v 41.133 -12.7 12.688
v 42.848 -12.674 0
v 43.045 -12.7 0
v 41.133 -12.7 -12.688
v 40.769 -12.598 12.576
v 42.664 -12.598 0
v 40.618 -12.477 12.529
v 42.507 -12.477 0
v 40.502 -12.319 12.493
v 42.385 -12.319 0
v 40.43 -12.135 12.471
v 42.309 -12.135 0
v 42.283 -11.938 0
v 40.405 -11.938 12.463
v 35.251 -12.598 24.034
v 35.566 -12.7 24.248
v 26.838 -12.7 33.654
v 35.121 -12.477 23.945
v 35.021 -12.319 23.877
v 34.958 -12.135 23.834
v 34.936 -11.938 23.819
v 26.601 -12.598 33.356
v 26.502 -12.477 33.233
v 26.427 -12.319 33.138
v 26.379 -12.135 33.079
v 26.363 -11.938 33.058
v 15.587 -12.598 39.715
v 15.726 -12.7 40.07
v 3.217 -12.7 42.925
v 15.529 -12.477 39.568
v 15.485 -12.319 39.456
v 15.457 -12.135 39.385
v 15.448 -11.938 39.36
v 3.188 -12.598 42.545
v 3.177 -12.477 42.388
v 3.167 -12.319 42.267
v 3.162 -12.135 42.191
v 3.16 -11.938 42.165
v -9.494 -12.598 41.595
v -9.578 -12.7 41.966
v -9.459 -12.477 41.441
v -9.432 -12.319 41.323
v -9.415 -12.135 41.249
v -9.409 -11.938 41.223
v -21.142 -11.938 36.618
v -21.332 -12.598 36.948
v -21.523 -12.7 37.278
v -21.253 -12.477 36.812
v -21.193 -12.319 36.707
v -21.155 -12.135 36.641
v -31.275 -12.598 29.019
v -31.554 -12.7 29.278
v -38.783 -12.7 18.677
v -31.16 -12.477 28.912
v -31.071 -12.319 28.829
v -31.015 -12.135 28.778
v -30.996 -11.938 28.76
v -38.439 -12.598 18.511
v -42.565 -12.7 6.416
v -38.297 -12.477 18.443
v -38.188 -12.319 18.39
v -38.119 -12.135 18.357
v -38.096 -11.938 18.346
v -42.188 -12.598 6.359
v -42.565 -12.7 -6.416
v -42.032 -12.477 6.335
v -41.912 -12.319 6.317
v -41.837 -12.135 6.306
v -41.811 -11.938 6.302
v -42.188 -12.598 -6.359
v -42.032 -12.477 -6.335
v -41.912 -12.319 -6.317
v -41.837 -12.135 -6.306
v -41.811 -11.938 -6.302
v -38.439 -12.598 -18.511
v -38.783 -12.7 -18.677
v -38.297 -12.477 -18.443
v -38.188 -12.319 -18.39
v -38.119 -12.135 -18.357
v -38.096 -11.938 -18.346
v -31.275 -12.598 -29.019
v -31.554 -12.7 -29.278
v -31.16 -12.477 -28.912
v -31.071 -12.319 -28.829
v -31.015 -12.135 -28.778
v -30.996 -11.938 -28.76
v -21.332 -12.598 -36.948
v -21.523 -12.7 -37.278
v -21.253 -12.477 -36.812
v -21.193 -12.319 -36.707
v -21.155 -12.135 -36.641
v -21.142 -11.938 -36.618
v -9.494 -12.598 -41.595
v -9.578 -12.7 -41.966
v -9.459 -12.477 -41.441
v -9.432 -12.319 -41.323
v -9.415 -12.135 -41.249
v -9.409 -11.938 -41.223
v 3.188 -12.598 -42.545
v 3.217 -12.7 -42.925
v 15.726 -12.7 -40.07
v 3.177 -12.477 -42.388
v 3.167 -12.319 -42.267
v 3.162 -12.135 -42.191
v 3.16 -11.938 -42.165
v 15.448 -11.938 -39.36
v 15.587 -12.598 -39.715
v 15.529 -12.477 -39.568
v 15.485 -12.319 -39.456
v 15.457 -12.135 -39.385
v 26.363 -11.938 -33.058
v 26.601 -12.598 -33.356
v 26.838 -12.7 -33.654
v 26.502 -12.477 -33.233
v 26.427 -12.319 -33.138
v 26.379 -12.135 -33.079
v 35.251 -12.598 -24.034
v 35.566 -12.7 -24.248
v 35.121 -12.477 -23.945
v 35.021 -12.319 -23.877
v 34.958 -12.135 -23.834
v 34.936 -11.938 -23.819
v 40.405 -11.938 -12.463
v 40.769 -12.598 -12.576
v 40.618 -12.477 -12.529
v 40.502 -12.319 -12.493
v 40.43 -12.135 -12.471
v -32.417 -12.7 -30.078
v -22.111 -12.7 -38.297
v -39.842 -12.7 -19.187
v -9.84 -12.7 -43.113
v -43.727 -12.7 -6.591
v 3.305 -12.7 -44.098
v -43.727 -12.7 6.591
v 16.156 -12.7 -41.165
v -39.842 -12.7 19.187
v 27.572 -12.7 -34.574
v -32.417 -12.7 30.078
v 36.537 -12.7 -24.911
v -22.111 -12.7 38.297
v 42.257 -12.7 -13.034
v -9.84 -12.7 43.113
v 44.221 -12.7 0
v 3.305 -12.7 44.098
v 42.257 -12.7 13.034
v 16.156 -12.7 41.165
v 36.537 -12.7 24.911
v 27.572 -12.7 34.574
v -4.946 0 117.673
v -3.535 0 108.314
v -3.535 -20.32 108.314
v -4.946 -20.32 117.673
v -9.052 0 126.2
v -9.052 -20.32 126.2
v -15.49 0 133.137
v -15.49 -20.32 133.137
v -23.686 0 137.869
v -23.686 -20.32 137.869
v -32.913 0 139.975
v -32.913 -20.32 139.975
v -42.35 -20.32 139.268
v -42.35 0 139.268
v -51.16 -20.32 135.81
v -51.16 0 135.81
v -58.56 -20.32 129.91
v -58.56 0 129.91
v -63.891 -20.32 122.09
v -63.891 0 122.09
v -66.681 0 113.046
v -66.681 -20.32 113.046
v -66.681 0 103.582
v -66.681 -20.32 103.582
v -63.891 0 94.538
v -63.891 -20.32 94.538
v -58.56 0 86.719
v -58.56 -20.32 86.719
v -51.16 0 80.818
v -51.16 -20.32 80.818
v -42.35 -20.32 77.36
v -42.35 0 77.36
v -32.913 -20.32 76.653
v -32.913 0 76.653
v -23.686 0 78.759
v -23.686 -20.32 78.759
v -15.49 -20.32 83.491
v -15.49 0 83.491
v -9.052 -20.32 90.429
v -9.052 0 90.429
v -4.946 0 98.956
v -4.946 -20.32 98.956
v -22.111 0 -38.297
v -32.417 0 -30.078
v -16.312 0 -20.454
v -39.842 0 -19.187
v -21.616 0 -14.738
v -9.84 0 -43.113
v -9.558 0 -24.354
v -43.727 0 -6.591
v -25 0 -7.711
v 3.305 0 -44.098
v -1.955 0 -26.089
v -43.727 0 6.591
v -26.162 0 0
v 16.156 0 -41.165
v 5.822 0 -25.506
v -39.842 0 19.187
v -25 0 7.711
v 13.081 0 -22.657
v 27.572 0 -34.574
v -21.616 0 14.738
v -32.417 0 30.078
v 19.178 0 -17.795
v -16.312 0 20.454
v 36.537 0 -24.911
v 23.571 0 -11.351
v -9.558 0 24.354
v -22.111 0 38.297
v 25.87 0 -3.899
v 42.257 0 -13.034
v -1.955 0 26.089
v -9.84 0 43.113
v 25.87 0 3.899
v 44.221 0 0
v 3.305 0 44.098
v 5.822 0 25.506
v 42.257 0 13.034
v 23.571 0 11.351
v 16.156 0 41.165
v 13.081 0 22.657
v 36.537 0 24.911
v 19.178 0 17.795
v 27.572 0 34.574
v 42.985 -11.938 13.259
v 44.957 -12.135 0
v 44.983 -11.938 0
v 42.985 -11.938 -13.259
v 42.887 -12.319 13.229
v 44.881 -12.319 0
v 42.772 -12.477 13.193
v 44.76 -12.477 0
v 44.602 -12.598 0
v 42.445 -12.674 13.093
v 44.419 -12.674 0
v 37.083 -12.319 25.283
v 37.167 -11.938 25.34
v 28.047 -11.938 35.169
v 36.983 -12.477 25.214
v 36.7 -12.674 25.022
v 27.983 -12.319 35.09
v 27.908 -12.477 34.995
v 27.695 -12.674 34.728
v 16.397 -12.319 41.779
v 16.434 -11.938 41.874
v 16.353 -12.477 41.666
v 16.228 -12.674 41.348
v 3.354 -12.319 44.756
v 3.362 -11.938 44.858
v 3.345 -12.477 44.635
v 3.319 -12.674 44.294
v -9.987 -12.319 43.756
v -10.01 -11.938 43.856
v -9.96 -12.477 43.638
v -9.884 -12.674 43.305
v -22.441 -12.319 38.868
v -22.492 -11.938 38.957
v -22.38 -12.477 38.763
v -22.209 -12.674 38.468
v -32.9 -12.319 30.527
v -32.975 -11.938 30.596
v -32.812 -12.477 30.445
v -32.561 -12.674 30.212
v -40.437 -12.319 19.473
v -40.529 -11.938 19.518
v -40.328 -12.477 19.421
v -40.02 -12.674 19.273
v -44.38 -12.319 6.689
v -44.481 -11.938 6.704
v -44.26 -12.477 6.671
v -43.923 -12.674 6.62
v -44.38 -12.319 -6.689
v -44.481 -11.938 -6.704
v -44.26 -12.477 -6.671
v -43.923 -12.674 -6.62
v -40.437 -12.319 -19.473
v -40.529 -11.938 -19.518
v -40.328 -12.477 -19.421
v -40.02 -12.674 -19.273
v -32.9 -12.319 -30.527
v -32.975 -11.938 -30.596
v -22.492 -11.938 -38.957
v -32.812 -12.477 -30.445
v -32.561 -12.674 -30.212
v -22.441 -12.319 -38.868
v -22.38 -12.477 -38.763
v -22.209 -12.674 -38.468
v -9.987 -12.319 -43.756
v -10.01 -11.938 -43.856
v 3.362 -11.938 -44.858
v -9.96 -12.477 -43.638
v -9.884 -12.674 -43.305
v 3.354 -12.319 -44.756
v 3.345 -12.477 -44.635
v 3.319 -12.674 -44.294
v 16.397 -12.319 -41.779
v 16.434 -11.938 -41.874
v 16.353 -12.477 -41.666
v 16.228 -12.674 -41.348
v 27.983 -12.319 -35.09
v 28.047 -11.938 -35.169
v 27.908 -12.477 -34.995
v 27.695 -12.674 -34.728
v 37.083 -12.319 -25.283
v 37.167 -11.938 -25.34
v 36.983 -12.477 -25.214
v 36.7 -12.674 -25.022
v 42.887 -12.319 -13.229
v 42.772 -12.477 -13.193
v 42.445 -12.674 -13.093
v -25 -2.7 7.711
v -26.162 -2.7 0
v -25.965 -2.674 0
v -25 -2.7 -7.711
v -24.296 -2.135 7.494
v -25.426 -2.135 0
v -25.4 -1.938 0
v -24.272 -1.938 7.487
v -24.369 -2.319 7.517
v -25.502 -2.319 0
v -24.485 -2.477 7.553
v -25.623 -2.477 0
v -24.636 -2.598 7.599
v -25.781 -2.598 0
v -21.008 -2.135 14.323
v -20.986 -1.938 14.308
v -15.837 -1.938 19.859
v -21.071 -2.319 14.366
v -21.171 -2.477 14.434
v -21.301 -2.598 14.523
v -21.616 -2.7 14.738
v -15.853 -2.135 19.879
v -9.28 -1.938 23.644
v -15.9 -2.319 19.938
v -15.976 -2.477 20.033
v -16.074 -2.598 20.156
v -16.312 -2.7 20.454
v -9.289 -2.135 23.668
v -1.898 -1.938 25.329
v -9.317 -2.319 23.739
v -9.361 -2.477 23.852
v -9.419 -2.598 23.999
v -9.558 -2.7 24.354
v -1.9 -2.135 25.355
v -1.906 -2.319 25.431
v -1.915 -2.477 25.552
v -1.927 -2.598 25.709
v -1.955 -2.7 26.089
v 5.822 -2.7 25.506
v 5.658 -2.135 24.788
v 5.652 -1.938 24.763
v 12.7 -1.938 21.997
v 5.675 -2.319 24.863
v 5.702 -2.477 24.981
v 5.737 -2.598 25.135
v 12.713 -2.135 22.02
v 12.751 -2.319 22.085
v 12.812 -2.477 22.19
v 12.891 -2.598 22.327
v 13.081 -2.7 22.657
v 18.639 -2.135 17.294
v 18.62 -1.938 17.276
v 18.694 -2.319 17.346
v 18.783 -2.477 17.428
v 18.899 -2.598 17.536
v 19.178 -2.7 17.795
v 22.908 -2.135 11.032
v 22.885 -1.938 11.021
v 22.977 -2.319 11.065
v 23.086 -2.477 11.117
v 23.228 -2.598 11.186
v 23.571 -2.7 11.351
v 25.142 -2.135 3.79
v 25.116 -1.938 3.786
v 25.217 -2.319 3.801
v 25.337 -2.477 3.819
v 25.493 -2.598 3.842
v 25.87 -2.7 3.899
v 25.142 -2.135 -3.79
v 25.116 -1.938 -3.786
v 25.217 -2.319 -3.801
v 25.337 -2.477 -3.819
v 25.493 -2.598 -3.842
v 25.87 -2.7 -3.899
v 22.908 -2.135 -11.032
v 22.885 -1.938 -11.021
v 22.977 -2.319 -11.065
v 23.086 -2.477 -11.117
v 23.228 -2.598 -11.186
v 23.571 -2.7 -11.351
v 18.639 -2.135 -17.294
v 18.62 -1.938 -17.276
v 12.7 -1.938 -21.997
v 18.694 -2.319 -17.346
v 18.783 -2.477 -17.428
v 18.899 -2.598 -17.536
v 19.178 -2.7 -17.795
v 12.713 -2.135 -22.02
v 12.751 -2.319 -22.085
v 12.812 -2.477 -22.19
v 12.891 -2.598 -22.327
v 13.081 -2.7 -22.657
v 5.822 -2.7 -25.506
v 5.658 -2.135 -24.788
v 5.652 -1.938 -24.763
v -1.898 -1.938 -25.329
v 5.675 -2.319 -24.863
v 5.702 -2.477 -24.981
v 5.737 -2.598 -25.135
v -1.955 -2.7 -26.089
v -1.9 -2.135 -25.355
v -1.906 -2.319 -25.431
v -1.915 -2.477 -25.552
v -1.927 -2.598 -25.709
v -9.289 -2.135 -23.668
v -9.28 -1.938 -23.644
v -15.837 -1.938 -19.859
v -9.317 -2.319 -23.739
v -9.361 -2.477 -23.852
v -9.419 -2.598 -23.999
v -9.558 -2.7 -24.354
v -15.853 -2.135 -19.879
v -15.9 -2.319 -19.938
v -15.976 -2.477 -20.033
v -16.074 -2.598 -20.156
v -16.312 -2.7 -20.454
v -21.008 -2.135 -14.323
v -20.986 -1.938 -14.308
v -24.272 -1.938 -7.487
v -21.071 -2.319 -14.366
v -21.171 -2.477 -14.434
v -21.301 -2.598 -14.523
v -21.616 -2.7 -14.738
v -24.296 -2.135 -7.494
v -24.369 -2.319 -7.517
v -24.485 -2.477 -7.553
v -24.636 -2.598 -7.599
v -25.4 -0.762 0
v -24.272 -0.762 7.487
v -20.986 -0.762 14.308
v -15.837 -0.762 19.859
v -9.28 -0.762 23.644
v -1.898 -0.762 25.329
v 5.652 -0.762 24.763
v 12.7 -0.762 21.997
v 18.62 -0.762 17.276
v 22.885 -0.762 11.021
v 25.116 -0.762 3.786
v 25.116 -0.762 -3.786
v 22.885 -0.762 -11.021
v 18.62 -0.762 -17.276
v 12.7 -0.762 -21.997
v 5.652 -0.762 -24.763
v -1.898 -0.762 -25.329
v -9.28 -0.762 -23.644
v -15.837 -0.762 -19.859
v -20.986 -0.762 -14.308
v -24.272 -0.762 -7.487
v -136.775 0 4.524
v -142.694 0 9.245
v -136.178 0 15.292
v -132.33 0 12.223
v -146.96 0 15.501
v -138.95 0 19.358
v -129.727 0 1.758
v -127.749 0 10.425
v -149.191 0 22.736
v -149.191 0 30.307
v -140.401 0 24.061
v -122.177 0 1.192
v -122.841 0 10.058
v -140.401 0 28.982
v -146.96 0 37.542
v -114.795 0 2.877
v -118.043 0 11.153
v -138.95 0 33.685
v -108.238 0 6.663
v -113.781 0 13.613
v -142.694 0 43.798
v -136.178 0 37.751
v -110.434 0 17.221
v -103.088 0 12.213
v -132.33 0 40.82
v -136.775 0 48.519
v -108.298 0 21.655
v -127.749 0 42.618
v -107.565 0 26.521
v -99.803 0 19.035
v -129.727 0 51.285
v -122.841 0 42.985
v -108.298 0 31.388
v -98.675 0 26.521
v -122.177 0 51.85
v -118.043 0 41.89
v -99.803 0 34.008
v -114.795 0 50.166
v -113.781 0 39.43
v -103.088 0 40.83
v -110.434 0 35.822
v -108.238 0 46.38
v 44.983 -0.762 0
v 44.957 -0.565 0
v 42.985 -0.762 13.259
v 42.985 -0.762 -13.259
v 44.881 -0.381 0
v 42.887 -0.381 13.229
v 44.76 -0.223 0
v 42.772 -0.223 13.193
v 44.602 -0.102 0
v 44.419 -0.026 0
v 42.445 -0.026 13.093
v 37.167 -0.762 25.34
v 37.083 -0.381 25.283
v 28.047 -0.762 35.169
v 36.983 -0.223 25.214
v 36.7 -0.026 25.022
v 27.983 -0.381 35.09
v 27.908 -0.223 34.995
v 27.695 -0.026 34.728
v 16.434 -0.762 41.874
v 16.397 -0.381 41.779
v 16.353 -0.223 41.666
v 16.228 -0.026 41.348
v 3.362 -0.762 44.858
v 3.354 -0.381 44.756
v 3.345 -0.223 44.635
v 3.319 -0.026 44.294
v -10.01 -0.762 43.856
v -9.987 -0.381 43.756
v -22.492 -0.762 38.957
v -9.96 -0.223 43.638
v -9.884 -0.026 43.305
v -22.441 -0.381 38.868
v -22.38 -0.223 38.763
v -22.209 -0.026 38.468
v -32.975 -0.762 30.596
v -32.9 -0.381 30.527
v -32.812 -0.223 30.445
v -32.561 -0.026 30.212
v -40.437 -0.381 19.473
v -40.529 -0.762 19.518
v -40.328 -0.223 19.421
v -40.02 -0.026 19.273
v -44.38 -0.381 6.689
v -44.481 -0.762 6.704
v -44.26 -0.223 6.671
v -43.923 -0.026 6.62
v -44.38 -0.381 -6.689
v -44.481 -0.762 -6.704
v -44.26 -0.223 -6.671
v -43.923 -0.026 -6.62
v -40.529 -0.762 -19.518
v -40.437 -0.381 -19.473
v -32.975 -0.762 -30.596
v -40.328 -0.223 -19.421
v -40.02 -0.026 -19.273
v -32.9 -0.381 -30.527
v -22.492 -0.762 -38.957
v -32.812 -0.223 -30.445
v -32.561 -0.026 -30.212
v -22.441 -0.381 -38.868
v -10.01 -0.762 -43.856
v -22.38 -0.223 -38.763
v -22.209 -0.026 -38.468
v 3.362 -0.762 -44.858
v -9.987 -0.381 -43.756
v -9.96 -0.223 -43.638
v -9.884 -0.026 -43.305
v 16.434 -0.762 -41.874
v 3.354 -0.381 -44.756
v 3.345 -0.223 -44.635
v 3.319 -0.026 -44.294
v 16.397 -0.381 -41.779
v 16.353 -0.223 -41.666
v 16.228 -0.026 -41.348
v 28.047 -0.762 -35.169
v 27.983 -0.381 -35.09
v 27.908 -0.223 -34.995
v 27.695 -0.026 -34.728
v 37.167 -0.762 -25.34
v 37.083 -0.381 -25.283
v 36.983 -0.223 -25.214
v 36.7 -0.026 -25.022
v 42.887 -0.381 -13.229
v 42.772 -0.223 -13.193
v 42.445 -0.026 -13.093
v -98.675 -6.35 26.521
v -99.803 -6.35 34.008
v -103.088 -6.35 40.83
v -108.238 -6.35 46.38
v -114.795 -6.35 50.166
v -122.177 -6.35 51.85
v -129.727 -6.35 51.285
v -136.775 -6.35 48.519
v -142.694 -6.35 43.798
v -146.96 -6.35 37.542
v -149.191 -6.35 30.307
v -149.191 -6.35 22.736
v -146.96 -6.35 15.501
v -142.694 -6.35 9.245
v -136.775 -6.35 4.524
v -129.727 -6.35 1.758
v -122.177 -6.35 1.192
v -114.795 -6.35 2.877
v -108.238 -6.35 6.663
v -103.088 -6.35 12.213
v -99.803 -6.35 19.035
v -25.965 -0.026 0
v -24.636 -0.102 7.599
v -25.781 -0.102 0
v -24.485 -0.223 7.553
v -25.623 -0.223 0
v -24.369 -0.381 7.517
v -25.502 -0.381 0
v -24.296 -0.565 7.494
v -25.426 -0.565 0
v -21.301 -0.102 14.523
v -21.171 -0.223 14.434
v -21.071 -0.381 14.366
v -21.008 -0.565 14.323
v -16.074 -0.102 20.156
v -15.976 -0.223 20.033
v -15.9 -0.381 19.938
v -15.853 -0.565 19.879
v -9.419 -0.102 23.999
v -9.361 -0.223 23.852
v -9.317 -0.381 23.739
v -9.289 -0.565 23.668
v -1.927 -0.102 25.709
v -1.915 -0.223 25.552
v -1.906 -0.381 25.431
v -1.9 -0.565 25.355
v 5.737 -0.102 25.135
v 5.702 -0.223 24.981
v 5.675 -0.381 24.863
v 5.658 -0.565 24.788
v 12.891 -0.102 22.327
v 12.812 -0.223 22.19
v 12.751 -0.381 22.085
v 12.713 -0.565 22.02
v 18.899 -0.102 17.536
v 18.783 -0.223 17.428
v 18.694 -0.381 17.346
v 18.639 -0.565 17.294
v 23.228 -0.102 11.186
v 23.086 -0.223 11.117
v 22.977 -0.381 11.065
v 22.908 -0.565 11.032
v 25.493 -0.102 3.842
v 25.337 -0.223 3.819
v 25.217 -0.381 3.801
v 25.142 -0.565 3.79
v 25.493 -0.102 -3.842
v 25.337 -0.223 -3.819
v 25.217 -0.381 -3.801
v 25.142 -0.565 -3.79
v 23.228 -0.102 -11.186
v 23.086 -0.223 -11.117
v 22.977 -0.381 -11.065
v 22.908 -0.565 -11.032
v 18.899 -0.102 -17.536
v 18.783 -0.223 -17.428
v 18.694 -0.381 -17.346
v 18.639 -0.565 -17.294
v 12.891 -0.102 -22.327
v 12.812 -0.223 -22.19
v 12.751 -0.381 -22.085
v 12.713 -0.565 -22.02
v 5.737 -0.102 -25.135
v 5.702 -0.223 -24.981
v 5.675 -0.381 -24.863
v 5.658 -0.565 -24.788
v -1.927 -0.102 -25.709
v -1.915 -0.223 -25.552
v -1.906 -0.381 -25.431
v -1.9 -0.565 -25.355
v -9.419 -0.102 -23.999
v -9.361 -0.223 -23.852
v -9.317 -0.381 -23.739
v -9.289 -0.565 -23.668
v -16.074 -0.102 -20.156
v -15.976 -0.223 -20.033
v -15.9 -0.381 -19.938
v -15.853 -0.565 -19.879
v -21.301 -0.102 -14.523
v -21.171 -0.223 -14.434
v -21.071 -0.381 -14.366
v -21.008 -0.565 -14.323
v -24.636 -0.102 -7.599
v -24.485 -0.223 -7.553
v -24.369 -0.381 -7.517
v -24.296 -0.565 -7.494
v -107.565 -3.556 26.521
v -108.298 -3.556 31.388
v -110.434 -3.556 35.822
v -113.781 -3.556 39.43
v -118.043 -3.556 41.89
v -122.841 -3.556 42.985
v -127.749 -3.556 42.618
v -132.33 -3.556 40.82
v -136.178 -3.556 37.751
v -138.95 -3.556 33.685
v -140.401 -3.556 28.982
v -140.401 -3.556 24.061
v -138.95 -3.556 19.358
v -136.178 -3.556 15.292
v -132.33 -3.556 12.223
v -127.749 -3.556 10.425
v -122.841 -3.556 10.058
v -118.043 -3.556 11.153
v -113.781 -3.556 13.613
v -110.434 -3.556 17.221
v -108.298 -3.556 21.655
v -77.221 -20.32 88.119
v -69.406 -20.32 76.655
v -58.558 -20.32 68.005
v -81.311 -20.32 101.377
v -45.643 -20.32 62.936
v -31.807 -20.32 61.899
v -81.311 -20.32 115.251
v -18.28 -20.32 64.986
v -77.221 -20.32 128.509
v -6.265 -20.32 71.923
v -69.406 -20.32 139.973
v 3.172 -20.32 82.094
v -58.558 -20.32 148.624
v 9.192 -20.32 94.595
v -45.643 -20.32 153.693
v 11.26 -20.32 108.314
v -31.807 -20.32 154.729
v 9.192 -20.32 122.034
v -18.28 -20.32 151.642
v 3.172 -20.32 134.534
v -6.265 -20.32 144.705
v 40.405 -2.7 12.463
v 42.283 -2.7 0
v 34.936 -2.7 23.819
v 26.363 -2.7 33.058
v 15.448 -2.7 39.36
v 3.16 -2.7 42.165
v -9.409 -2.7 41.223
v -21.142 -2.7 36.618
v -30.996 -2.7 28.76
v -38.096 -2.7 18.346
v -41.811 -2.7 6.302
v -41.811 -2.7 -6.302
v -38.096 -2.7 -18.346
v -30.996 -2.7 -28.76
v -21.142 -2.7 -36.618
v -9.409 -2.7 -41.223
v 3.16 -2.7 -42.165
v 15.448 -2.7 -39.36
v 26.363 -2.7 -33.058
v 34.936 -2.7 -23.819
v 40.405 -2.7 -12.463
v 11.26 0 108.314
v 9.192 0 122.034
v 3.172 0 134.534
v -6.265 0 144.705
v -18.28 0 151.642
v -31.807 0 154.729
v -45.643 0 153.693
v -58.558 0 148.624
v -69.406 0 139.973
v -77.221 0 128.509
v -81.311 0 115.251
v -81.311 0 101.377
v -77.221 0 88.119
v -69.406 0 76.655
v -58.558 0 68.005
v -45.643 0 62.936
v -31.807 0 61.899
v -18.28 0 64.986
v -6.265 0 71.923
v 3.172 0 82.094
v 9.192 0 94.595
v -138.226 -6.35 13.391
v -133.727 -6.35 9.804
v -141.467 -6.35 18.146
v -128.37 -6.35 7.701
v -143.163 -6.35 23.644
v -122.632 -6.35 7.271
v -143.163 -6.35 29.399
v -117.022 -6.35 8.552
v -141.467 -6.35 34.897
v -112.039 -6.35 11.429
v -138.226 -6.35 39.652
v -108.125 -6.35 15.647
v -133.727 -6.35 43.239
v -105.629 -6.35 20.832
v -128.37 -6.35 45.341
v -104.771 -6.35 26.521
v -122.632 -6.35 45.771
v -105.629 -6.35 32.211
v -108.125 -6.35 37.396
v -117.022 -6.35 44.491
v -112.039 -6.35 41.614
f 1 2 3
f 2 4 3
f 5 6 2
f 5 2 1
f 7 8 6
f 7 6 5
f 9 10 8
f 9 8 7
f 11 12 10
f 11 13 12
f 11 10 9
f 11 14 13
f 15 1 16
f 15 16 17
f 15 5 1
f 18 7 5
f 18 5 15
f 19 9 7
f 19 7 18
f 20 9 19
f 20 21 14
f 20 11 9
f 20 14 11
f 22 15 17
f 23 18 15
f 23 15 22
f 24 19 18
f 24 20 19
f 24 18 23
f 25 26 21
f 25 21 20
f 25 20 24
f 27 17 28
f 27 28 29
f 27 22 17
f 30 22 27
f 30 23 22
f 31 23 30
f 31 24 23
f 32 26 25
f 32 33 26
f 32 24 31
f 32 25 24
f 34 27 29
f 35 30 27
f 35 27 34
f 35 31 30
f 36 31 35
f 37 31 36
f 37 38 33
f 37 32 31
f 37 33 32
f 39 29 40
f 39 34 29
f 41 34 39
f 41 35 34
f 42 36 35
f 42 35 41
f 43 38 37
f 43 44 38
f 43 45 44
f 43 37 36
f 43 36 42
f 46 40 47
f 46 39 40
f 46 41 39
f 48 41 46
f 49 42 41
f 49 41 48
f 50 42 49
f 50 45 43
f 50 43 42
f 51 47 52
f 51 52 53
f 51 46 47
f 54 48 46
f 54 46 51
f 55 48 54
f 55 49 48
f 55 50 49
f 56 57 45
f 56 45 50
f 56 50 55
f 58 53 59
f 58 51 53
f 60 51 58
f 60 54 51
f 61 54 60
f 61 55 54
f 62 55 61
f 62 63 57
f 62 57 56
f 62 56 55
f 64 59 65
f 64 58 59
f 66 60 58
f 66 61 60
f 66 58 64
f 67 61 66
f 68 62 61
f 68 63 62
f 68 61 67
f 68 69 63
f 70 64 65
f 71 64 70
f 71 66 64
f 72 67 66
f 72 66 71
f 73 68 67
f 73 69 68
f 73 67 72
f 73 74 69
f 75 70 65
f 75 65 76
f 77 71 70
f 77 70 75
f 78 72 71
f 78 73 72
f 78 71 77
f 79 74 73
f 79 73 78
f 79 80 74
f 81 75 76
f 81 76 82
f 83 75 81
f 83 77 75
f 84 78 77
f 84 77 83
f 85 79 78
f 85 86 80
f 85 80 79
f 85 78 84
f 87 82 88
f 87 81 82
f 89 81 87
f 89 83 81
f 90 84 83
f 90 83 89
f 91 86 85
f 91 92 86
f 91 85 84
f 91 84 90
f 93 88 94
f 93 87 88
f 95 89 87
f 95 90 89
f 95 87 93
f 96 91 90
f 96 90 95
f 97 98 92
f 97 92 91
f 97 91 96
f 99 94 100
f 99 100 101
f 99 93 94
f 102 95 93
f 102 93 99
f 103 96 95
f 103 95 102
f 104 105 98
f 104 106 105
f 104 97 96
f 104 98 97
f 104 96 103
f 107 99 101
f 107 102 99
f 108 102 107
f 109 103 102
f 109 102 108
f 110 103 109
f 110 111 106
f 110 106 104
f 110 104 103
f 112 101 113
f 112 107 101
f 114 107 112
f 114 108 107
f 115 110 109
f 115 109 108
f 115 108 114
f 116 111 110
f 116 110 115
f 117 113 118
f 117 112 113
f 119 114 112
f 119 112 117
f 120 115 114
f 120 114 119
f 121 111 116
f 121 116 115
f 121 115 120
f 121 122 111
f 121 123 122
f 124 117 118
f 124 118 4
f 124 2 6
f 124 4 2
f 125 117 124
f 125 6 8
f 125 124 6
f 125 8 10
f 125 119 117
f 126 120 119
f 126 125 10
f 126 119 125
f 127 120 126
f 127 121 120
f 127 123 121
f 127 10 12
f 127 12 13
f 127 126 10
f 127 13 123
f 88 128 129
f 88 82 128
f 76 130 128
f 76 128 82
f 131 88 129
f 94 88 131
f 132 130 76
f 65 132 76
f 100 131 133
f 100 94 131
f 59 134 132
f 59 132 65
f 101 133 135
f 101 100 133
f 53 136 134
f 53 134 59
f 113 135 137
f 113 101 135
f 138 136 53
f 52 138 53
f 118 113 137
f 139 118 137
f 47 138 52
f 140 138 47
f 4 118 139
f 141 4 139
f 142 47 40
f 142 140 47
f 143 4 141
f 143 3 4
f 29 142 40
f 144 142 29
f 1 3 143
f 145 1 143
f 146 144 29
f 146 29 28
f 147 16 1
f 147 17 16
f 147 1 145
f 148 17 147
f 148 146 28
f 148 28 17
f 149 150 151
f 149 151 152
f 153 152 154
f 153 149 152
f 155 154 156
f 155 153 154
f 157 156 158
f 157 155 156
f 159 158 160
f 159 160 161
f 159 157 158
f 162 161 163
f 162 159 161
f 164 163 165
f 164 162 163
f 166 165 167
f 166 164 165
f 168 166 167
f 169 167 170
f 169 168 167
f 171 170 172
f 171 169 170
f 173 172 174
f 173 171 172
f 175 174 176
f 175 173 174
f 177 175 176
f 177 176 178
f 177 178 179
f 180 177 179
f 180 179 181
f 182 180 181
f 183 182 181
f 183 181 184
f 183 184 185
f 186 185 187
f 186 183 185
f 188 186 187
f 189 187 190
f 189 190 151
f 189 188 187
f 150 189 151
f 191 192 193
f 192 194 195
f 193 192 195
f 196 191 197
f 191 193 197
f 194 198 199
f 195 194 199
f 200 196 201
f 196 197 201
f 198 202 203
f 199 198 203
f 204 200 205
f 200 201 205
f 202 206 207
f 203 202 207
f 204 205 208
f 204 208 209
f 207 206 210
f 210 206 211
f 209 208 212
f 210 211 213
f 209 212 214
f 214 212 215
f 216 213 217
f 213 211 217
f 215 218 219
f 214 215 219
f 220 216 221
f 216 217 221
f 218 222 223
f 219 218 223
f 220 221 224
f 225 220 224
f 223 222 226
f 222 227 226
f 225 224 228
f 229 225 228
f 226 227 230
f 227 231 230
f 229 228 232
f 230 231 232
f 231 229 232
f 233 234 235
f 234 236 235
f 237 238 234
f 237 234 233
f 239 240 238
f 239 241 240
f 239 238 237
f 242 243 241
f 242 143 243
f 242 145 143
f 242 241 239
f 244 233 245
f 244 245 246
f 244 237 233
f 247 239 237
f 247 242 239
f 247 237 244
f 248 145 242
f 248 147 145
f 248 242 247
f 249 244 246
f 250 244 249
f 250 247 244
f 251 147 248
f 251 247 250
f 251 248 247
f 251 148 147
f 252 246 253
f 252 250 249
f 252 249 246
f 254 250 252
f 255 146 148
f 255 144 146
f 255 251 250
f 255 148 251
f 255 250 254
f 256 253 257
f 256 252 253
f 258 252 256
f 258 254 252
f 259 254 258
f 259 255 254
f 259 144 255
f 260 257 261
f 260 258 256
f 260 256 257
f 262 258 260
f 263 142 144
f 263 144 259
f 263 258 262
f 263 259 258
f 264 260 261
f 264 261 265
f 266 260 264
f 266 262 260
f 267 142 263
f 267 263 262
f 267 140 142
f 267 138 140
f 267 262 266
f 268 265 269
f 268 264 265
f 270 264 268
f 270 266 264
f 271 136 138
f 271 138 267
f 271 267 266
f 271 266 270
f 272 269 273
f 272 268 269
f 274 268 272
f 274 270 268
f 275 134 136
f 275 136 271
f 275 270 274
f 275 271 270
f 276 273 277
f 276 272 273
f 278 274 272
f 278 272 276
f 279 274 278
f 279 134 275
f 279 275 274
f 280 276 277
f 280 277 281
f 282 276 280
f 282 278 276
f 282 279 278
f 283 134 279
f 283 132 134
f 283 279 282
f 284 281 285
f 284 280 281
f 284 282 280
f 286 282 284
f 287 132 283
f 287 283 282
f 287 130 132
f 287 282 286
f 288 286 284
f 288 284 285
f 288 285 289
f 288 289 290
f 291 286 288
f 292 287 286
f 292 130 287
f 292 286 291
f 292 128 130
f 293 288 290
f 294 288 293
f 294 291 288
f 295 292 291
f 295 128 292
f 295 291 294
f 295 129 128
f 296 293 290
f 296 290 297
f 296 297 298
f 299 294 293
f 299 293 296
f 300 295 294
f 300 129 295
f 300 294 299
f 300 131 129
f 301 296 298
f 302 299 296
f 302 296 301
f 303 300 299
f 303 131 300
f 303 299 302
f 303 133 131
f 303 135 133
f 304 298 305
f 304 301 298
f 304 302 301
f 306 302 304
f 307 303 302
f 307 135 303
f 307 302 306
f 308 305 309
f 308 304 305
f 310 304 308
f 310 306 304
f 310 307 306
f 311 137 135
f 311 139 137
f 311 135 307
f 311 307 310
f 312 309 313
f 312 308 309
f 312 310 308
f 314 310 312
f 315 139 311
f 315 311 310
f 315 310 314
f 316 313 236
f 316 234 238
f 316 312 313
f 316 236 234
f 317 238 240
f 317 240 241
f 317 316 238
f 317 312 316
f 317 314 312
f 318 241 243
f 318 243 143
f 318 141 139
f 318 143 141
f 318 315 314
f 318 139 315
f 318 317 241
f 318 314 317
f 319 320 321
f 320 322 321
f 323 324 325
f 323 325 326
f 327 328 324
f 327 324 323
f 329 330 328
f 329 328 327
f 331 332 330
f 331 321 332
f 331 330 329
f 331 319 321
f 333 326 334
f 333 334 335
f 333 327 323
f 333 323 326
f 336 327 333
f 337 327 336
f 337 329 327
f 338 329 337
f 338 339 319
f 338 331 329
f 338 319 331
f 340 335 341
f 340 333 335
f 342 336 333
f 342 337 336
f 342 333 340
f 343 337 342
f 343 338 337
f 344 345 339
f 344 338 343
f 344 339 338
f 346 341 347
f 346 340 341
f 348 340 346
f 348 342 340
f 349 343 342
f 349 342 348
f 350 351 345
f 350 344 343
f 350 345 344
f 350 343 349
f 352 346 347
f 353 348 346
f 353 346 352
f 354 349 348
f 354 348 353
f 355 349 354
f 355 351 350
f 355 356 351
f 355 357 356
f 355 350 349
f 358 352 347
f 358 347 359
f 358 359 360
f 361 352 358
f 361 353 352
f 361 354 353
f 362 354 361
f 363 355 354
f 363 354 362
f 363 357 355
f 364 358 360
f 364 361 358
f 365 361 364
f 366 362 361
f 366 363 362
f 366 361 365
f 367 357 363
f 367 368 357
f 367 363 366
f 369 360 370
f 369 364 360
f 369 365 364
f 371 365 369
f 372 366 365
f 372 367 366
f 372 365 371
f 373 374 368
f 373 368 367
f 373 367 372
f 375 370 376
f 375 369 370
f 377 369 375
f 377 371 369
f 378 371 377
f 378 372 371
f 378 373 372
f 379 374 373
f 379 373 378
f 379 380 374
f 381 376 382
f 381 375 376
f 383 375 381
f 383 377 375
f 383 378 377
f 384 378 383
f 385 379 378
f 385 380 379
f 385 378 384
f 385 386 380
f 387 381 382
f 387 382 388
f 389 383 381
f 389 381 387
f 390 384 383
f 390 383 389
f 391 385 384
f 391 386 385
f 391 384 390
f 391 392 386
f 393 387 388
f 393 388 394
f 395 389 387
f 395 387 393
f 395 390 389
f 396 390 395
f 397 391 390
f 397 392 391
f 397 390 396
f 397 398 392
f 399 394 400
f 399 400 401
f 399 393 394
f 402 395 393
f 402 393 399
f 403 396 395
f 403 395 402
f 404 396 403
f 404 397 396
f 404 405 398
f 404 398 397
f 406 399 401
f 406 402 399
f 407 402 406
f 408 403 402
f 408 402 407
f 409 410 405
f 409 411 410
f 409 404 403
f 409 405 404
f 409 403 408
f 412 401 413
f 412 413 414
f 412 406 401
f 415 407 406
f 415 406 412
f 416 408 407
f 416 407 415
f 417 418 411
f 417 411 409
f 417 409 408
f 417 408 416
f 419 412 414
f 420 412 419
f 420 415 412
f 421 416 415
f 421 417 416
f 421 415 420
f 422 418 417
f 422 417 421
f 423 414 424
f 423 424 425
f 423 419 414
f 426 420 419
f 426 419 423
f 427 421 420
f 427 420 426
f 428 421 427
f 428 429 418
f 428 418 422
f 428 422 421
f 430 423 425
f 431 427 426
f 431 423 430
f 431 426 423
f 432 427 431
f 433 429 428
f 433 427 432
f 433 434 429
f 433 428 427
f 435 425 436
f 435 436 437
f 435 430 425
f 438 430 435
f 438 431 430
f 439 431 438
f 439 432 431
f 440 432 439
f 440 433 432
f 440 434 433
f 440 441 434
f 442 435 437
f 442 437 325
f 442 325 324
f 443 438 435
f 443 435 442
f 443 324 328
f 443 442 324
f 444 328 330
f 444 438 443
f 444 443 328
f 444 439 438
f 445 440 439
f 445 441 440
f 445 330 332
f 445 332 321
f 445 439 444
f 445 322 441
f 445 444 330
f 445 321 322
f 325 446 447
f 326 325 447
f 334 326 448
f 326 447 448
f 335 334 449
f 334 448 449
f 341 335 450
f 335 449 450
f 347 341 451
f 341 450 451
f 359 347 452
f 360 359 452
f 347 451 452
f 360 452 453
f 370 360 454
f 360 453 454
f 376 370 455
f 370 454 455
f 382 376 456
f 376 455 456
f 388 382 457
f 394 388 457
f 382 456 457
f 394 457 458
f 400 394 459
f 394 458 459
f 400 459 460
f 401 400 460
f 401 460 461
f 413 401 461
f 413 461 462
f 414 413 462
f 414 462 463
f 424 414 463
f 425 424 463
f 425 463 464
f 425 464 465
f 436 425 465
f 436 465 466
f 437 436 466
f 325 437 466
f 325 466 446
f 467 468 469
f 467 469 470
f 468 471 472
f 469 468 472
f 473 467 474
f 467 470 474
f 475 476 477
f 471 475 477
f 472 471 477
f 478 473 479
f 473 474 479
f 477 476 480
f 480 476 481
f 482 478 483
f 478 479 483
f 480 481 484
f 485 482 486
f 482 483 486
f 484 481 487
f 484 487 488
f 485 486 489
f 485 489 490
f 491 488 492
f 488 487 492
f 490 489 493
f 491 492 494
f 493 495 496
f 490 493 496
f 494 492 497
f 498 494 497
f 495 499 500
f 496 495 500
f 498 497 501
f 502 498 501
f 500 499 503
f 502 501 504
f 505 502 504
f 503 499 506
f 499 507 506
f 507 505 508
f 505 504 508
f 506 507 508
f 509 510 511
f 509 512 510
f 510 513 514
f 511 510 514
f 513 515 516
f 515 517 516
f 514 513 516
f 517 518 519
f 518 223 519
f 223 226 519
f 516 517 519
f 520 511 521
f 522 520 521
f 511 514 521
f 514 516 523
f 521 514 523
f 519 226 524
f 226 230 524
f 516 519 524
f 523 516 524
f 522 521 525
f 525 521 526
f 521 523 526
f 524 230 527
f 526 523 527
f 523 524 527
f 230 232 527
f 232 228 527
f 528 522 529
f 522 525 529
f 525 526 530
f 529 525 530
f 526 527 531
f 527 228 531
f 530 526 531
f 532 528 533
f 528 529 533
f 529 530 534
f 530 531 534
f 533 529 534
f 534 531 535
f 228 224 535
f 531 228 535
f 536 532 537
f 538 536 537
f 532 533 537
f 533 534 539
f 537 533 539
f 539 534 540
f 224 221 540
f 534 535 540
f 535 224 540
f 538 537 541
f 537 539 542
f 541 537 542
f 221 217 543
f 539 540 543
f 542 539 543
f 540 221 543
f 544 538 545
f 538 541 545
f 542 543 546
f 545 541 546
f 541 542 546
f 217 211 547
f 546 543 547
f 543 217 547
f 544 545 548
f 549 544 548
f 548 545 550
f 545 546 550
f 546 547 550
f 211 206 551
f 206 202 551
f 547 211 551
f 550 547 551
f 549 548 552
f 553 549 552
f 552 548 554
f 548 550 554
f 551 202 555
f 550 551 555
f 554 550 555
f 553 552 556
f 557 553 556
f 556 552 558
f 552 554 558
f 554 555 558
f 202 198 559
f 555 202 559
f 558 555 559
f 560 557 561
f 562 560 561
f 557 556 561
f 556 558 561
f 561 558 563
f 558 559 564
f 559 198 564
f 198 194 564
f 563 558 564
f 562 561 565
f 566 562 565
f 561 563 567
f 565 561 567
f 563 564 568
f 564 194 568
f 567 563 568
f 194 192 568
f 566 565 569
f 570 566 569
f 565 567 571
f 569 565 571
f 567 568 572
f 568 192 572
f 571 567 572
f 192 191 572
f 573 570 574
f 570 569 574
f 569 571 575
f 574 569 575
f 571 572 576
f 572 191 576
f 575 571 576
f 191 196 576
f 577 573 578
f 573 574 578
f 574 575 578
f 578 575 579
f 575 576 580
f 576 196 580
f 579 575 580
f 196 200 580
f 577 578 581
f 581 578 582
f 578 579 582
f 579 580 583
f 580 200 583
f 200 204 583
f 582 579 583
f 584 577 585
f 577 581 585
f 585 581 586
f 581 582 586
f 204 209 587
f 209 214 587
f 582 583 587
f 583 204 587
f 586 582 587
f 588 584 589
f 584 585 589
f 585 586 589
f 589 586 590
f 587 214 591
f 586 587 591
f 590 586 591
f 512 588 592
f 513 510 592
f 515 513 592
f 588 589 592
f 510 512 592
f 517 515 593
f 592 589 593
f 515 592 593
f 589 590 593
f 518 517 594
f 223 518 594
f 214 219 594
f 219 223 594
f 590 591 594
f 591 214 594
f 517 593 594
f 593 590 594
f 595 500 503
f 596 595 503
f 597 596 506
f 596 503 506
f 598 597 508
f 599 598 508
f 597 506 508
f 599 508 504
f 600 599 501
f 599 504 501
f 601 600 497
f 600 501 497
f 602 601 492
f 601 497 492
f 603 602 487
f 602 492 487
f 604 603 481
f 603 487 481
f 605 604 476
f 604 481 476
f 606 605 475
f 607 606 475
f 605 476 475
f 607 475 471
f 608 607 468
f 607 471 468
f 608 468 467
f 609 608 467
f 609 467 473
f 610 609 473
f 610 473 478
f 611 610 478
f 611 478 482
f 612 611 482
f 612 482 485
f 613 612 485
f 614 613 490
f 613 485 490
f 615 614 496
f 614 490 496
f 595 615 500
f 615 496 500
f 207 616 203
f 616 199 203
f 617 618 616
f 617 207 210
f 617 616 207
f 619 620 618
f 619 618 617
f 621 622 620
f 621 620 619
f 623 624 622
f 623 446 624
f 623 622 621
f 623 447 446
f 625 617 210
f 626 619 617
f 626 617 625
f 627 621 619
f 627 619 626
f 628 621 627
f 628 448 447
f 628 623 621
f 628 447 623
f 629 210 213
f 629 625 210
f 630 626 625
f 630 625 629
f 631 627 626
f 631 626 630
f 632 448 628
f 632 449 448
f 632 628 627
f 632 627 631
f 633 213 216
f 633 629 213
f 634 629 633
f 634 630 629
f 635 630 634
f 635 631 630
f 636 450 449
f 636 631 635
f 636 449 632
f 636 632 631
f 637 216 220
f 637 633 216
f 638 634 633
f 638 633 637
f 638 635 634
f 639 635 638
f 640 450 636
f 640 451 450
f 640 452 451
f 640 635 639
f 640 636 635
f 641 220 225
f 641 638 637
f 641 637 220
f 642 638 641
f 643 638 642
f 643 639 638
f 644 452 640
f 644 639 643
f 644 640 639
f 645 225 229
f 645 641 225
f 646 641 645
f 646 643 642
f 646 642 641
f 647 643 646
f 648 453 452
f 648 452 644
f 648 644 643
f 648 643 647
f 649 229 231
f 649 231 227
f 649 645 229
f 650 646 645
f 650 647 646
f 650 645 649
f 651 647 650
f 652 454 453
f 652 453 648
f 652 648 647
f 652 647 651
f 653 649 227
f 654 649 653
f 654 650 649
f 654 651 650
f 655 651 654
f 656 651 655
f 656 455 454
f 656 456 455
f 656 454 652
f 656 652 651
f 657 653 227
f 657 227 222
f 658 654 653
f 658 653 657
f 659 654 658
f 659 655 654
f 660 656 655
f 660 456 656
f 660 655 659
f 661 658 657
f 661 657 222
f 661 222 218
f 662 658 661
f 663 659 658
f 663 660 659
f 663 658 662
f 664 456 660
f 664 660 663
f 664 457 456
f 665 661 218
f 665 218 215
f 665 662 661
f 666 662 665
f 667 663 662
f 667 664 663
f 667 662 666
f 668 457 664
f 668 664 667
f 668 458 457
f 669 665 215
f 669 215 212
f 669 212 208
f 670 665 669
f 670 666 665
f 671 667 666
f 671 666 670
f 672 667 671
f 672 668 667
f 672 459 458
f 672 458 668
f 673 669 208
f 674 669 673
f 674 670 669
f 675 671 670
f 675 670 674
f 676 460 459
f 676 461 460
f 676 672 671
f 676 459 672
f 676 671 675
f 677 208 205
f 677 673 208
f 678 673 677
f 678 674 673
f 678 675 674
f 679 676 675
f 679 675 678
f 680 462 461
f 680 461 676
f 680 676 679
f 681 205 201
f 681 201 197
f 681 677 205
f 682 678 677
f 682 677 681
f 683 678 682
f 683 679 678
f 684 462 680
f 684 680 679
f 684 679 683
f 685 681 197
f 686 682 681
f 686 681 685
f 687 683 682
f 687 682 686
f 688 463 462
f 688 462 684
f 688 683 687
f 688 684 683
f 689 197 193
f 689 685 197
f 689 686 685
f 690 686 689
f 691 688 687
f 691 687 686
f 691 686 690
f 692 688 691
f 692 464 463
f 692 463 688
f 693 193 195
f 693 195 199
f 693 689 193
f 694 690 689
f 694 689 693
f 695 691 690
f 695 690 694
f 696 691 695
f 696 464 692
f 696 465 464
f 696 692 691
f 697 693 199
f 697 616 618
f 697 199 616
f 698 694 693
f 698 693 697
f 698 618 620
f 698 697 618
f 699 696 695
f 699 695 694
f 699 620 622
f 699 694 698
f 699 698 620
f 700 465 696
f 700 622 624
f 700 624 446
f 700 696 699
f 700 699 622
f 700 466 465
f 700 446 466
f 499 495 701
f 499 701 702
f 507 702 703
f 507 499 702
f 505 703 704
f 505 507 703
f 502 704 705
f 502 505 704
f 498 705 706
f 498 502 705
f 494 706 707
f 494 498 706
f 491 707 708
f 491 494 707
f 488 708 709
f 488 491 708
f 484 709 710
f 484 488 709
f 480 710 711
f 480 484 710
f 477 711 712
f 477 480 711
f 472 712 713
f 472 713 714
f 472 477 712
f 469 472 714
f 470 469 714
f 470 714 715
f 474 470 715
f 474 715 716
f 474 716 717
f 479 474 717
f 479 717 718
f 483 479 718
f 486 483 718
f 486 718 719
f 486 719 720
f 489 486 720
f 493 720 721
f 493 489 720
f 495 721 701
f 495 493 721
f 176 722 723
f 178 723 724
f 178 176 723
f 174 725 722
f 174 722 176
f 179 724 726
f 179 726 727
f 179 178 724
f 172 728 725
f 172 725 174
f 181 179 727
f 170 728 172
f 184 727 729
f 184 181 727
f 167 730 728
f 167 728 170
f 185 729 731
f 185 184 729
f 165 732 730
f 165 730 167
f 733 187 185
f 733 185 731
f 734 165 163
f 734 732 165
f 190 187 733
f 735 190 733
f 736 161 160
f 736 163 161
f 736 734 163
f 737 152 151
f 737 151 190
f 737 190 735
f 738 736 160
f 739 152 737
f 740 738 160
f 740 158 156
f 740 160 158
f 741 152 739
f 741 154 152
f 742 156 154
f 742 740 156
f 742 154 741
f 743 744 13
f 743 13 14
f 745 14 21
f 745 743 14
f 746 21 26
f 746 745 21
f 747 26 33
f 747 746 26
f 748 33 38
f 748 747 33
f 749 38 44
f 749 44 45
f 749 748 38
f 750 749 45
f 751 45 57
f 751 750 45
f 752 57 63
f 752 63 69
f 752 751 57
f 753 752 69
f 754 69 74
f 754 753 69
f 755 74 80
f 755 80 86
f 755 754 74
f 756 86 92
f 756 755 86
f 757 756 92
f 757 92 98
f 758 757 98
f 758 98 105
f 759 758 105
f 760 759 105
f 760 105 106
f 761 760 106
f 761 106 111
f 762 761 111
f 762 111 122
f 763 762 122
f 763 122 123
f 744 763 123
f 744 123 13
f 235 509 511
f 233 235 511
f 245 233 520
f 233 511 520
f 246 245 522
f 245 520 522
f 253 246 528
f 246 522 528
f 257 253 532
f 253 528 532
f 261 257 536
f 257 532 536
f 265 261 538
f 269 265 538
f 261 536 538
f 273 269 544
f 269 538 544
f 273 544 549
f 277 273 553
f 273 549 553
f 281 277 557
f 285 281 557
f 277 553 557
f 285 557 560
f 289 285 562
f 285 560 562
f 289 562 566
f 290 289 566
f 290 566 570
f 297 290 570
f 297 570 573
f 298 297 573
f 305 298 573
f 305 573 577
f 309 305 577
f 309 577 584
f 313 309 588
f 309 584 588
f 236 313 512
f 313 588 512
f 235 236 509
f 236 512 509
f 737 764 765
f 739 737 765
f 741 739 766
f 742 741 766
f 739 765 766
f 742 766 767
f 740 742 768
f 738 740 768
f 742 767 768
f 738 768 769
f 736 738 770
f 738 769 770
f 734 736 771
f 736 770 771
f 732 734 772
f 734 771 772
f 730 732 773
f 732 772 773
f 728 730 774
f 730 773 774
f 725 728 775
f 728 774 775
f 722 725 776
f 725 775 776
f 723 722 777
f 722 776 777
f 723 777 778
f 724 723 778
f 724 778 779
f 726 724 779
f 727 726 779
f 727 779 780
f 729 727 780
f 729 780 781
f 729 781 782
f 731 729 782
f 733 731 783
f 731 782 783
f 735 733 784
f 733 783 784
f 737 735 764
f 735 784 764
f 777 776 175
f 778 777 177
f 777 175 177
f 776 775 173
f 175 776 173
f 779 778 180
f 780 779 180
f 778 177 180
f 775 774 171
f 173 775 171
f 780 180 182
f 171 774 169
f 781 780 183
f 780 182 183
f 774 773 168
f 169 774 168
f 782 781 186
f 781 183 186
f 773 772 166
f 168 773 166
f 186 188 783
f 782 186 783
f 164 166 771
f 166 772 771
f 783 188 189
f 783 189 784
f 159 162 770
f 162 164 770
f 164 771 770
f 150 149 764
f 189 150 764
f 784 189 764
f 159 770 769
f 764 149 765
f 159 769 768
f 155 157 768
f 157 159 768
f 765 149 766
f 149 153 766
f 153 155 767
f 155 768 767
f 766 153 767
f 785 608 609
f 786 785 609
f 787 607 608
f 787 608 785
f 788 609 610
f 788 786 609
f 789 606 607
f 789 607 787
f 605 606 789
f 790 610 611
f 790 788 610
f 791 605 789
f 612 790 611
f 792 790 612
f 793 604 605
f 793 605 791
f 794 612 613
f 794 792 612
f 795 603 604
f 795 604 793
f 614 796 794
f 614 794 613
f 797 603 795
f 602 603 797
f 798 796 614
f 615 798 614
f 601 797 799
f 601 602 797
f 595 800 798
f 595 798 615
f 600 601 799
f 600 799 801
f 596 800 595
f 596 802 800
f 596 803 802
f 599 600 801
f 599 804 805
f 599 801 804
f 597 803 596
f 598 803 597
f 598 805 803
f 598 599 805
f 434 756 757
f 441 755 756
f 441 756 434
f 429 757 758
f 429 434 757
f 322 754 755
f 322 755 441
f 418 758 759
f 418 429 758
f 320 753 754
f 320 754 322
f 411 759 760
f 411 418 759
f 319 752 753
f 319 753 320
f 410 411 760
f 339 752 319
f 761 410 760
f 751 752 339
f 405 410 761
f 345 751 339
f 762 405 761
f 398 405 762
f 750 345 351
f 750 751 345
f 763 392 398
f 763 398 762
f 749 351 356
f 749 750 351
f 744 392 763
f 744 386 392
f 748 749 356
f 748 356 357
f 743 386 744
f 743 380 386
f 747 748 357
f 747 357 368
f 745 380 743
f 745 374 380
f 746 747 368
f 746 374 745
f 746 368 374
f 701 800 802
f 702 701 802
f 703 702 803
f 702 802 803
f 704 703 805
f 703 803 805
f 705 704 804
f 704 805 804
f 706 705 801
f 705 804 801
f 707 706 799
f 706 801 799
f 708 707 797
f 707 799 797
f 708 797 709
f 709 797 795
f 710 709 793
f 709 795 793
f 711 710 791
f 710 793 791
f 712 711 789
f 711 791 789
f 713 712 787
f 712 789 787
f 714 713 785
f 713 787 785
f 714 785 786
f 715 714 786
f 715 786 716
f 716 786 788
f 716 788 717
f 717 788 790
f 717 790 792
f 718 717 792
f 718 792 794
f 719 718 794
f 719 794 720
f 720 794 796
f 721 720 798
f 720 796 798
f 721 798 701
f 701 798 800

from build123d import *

# Parameters (mm, degrees)
F0_R            = 44.9834
F0_R_2          = 38.6334
F1_DEPTH        = 12.7
F2_T            = -2.70002
F3_R            = 25.4
F4_DEPTH        = 25.4
F5_R            = 0.762
F6_R            = 25.4
F6_R_2          = 16.51
F7_DEPTH        = 6.35
F8_SIZE         = 2.794
F9_R            = 46.5455
F9_R_2          = 31.75
F10_DEPTH       = 20.32
F11_W           = 44.5577651262
F11_H           = 45.586027205
F12_DEPTH       = 25.4
F14_D           = 25.4
F14_DEPTH       = 50.8
F14_CSINK_D     = 37.74948
F14_CSINK_ANGLE = 90
F14_TIP         = 7.6309298617


with BuildPart() as f1:
    # F0 (on Front) → F1 (new body)
    with BuildSketch(Plane.XZ):
        Circle(F0_R)
        Circle(F0_R_2, mode=Mode.SUBTRACT)
        Circle(F0_R_2)
    extrude(amount=F1_DEPTH)

    # F2
    f2_openings = [f1.faces().sort_by_distance(p)[0] for p in [
        (0, -12.7, 0),
    ]]
    offset(amount=F2_T, openings=f2_openings)

    # F3 (on face) → F4 (cut)
    with BuildSketch(Plane(origin=(0, 0, 0), x_dir=(-1, 0, 0), z_dir=(0, 1, 0))):
        Circle(F3_R)
    extrude(amount=-F4_DEPTH, mode=Mode.SUBTRACT)

    # F5
    f5_edges = [f1.edges().sort_by_distance(p)[0] for p in [
        (-44.9834, -12.7, 0),
        (-42.28338, -12.7, 0),
        (-44.9834, 0, 0),
        (25.4, 0, 0),
        (25.4, -2.70002, 0),
    ]]
    fillet(f5_edges, radius=F5_R)


with BuildPart() as f7:
    # F6 (on Front) → F7 (new body)
    with BuildSketch(Plane.XZ):
        with Locations((-124.0749135613, 26.5214759856)):
            Circle(F6_R)
        with Locations((-124.0749135613, 26.5214759856)):
            Circle(F6_R_2, mode=Mode.SUBTRACT)
    extrude(amount=F7_DEPTH)

    # F8
    f8_edges = [f7.edges().sort_by_distance(p)[0] for p in [
        (-140.584914, -6.35, 26.521476),
    ]]
    chamfer(f8_edges, length=F8_SIZE)


with BuildPart() as f10:
    # F9 (on Front) → F10 (new body)
    with BuildSketch(Plane.XZ):
        with Locations((-35.2853350341, 108.3141416311)):
            Circle(F9_R)
        with Locations((-35.2853350341, 108.3141416311)):
            Circle(F9_R_2, mode=Mode.SUBTRACT)
    extrude(amount=F10_DEPTH)


with BuildPart() as f12:
    # F11 (on Front) → F12 (new body)
    with BuildSketch(Plane.XZ):
        with Locations((135.7298120856, 15.5952200294)):
            Rectangle(F11_W, F11_H)
    extrude(amount=F12_DEPTH)

    # F14
    with Locations(Plane.XZ.offset(25.4)):
        with Locations((135.7298120856, 15.5952200294)):
            CounterSinkHole(F14_D / 2, F14_CSINK_D / 2, depth=F14_DEPTH, counter_sink_angle=F14_CSINK_ANGLE)
            with Locations((0, 0, -(F14_DEPTH + F14_TIP / 2))):  # 118° drill point
                Cone(0, F14_D / 2, F14_TIP, mode=Mode.SUBTRACT)


solid = Compound([f1.part, f7.part, f10.part])
